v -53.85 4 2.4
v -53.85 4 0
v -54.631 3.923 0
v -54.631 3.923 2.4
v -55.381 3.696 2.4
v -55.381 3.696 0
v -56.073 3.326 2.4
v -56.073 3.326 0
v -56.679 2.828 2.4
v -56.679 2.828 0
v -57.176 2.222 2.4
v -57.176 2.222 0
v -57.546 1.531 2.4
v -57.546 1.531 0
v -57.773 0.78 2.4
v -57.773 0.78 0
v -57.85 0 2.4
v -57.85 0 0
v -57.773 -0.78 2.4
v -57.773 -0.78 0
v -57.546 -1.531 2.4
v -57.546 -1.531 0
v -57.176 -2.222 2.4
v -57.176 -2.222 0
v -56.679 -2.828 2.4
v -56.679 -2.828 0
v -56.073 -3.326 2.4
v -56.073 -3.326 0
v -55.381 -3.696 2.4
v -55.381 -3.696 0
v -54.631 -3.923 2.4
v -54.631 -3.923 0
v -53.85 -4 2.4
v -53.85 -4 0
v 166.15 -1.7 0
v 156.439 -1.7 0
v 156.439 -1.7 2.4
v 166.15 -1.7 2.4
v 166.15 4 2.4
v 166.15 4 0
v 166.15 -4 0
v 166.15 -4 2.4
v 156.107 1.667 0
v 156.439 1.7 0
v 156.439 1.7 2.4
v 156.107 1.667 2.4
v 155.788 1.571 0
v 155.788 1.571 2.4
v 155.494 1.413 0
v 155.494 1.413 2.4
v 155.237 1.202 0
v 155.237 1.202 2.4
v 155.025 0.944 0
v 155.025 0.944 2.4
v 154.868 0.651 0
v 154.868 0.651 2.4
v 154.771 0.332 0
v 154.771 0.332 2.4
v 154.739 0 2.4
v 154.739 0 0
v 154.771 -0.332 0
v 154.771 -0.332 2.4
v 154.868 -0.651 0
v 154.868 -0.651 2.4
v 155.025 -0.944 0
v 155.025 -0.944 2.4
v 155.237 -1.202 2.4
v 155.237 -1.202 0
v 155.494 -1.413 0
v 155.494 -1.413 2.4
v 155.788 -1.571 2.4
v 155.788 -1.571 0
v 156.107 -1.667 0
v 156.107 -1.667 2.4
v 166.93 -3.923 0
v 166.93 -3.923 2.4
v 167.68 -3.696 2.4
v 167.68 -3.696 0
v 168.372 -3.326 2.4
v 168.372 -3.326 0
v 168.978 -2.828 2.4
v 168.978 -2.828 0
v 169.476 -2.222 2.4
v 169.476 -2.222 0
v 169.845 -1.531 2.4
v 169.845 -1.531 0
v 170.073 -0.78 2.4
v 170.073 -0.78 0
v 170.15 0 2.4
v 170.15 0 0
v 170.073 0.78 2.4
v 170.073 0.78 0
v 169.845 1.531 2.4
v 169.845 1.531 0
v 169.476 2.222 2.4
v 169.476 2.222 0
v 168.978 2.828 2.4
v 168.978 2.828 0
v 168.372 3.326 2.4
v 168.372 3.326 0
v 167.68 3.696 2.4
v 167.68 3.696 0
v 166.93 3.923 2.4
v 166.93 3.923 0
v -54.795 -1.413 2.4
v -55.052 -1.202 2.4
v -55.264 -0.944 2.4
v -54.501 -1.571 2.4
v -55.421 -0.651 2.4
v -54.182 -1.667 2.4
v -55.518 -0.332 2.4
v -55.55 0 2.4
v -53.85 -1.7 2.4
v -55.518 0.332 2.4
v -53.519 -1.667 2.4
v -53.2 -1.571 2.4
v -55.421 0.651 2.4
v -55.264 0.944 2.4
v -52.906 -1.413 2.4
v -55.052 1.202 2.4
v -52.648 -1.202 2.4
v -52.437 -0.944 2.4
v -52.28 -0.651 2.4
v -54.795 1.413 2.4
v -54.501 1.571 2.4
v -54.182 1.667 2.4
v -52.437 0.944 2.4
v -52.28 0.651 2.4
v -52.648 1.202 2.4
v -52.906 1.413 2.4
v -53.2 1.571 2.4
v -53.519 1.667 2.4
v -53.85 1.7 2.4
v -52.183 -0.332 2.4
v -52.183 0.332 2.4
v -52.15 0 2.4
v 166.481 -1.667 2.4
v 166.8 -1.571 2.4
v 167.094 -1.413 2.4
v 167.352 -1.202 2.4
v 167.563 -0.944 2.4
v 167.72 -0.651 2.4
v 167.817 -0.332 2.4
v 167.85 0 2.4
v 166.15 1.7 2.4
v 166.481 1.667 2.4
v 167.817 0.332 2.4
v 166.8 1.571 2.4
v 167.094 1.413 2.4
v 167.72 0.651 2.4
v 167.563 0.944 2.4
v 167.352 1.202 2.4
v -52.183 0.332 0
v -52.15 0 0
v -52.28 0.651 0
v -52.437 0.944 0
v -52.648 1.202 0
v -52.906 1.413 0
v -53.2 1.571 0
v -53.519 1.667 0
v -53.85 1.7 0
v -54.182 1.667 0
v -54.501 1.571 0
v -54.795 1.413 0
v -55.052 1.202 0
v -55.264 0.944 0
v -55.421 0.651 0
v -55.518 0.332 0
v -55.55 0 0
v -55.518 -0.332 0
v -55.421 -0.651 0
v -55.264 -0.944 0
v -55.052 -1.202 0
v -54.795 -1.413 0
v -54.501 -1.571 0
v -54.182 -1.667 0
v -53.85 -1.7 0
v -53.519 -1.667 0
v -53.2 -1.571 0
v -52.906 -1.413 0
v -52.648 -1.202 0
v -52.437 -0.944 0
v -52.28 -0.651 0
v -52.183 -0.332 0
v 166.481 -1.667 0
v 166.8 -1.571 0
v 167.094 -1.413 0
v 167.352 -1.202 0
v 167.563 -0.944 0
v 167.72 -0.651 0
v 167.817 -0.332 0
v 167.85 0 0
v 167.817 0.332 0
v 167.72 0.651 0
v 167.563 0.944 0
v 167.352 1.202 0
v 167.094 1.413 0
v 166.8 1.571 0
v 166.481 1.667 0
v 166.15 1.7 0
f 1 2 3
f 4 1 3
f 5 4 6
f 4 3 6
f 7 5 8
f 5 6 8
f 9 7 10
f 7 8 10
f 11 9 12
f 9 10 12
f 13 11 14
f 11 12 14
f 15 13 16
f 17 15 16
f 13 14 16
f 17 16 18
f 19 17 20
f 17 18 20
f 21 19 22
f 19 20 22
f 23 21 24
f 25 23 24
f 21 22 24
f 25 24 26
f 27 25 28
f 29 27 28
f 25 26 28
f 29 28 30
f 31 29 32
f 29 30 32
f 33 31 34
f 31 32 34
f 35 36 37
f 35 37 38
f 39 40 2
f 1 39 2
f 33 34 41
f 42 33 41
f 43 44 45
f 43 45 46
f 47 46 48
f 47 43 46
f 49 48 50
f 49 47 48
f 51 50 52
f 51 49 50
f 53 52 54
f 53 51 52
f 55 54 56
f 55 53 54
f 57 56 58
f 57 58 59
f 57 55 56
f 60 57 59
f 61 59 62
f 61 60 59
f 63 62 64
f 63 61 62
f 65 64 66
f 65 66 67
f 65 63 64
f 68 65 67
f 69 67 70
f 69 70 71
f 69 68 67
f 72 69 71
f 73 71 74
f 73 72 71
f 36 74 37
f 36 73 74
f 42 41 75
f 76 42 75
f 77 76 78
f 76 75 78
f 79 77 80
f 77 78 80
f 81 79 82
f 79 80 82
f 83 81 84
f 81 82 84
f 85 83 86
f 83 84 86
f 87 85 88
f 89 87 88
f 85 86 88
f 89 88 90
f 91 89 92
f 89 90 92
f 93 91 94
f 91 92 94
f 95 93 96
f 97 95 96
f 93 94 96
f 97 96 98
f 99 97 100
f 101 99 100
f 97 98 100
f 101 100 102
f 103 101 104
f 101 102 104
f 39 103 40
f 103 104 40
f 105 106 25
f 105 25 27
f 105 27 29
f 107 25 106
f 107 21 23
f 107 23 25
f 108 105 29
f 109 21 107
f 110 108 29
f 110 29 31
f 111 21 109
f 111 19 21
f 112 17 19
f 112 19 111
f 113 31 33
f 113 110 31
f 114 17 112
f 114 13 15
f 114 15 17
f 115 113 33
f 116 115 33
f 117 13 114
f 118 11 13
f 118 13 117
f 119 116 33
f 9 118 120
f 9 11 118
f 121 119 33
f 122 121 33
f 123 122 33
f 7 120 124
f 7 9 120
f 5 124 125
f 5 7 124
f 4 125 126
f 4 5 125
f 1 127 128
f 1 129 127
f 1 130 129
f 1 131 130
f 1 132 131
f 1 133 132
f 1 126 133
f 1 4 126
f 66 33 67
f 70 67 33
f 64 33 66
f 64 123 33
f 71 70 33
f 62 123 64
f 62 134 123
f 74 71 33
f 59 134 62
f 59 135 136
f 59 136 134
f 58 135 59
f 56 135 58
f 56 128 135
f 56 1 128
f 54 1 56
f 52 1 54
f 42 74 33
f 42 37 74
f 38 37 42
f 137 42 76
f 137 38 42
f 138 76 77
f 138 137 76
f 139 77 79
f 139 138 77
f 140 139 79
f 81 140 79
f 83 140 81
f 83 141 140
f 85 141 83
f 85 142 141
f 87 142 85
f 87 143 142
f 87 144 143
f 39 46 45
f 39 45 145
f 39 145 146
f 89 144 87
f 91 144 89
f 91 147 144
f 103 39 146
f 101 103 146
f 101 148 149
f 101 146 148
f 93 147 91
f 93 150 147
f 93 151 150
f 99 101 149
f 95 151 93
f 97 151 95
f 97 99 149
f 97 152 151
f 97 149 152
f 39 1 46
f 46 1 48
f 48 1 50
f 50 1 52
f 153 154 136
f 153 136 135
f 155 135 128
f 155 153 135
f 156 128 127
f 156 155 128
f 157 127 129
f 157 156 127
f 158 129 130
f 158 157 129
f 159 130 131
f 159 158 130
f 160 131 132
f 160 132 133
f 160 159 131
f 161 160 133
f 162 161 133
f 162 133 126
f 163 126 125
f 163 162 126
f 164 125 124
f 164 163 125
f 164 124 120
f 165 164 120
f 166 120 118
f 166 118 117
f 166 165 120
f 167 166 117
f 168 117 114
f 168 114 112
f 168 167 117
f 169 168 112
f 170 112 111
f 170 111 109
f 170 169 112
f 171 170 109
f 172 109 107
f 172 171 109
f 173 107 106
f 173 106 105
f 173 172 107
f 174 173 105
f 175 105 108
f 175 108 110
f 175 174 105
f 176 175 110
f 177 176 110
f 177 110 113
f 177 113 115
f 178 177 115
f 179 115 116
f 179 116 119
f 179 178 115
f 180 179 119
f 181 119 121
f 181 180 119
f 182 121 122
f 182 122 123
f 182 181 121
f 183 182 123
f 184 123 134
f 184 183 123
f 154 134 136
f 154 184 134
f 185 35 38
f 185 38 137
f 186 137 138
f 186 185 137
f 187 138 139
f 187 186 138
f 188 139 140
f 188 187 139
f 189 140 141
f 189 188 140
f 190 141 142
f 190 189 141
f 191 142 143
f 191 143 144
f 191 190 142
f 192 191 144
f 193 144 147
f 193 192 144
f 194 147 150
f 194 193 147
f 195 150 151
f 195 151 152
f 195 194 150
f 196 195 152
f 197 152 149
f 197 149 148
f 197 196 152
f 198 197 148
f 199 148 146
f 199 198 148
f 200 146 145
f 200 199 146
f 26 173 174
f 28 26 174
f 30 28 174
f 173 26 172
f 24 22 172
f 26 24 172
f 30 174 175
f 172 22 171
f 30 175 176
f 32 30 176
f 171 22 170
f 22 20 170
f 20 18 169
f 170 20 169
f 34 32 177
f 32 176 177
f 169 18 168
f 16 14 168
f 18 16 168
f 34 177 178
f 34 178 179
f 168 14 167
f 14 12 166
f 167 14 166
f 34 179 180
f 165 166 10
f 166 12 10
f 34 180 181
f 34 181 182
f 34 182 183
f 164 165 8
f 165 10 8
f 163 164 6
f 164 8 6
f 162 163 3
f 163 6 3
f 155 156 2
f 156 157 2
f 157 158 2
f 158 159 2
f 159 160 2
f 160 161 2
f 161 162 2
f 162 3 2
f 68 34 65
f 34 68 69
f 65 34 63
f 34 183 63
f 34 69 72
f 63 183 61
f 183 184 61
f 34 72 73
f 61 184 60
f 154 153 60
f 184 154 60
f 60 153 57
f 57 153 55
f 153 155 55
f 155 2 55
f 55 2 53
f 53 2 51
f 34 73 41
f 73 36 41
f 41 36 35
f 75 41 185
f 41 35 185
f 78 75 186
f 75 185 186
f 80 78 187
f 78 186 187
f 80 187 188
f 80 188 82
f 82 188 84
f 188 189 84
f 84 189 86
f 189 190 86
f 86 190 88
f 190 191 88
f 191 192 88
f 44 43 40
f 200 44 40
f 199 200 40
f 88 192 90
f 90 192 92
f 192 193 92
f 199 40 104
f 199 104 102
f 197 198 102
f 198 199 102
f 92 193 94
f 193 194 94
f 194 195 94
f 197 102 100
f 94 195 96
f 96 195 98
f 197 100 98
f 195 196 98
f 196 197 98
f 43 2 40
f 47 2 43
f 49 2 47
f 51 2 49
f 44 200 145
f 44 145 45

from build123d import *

# Parameters (mm, degrees)
SKETCH_1_R      = 1.7
EXTRUDE_1_DEPTH = 2.4


with BuildPart() as part:
    # 草图1 → 凸台-拉伸1 (new body)
    with BuildSketch(Plane.XY):
        with BuildLine():
            Line((-53.850242828, -4), (166.149757172, -4))
            ThreePointArc((166.149757172, -4), (170.149757172, 0), (166.149757172, 4))
            Line((166.149757172, 4), (-53.850242828, 4))
            ThreePointArc((-53.850242828, 4), (-57.850242828, 0), (-53.850242828, -4))
        make_face()
        with Locations((-53.850242828, 0)):
            Circle(SKETCH_1_R, mode=Mode.SUBTRACT)
        with BuildLine():
            ThreePointArc((156.438691487, 1.7), (154.738691487, 0), (156.438691487, -1.7))
            Line((156.438691487, -1.7), (166.149757172, -1.7))
            ThreePointArc((166.149757172, -1.7), (167.849757172, 0), (166.149757172, 1.7))
            Line((166.149757172, 1.7), (156.438691487, 1.7))
        make_face(mode=Mode.SUBTRACT)
    extrude(amount=EXTRUDE_1_DEPTH)


solid = part.part
